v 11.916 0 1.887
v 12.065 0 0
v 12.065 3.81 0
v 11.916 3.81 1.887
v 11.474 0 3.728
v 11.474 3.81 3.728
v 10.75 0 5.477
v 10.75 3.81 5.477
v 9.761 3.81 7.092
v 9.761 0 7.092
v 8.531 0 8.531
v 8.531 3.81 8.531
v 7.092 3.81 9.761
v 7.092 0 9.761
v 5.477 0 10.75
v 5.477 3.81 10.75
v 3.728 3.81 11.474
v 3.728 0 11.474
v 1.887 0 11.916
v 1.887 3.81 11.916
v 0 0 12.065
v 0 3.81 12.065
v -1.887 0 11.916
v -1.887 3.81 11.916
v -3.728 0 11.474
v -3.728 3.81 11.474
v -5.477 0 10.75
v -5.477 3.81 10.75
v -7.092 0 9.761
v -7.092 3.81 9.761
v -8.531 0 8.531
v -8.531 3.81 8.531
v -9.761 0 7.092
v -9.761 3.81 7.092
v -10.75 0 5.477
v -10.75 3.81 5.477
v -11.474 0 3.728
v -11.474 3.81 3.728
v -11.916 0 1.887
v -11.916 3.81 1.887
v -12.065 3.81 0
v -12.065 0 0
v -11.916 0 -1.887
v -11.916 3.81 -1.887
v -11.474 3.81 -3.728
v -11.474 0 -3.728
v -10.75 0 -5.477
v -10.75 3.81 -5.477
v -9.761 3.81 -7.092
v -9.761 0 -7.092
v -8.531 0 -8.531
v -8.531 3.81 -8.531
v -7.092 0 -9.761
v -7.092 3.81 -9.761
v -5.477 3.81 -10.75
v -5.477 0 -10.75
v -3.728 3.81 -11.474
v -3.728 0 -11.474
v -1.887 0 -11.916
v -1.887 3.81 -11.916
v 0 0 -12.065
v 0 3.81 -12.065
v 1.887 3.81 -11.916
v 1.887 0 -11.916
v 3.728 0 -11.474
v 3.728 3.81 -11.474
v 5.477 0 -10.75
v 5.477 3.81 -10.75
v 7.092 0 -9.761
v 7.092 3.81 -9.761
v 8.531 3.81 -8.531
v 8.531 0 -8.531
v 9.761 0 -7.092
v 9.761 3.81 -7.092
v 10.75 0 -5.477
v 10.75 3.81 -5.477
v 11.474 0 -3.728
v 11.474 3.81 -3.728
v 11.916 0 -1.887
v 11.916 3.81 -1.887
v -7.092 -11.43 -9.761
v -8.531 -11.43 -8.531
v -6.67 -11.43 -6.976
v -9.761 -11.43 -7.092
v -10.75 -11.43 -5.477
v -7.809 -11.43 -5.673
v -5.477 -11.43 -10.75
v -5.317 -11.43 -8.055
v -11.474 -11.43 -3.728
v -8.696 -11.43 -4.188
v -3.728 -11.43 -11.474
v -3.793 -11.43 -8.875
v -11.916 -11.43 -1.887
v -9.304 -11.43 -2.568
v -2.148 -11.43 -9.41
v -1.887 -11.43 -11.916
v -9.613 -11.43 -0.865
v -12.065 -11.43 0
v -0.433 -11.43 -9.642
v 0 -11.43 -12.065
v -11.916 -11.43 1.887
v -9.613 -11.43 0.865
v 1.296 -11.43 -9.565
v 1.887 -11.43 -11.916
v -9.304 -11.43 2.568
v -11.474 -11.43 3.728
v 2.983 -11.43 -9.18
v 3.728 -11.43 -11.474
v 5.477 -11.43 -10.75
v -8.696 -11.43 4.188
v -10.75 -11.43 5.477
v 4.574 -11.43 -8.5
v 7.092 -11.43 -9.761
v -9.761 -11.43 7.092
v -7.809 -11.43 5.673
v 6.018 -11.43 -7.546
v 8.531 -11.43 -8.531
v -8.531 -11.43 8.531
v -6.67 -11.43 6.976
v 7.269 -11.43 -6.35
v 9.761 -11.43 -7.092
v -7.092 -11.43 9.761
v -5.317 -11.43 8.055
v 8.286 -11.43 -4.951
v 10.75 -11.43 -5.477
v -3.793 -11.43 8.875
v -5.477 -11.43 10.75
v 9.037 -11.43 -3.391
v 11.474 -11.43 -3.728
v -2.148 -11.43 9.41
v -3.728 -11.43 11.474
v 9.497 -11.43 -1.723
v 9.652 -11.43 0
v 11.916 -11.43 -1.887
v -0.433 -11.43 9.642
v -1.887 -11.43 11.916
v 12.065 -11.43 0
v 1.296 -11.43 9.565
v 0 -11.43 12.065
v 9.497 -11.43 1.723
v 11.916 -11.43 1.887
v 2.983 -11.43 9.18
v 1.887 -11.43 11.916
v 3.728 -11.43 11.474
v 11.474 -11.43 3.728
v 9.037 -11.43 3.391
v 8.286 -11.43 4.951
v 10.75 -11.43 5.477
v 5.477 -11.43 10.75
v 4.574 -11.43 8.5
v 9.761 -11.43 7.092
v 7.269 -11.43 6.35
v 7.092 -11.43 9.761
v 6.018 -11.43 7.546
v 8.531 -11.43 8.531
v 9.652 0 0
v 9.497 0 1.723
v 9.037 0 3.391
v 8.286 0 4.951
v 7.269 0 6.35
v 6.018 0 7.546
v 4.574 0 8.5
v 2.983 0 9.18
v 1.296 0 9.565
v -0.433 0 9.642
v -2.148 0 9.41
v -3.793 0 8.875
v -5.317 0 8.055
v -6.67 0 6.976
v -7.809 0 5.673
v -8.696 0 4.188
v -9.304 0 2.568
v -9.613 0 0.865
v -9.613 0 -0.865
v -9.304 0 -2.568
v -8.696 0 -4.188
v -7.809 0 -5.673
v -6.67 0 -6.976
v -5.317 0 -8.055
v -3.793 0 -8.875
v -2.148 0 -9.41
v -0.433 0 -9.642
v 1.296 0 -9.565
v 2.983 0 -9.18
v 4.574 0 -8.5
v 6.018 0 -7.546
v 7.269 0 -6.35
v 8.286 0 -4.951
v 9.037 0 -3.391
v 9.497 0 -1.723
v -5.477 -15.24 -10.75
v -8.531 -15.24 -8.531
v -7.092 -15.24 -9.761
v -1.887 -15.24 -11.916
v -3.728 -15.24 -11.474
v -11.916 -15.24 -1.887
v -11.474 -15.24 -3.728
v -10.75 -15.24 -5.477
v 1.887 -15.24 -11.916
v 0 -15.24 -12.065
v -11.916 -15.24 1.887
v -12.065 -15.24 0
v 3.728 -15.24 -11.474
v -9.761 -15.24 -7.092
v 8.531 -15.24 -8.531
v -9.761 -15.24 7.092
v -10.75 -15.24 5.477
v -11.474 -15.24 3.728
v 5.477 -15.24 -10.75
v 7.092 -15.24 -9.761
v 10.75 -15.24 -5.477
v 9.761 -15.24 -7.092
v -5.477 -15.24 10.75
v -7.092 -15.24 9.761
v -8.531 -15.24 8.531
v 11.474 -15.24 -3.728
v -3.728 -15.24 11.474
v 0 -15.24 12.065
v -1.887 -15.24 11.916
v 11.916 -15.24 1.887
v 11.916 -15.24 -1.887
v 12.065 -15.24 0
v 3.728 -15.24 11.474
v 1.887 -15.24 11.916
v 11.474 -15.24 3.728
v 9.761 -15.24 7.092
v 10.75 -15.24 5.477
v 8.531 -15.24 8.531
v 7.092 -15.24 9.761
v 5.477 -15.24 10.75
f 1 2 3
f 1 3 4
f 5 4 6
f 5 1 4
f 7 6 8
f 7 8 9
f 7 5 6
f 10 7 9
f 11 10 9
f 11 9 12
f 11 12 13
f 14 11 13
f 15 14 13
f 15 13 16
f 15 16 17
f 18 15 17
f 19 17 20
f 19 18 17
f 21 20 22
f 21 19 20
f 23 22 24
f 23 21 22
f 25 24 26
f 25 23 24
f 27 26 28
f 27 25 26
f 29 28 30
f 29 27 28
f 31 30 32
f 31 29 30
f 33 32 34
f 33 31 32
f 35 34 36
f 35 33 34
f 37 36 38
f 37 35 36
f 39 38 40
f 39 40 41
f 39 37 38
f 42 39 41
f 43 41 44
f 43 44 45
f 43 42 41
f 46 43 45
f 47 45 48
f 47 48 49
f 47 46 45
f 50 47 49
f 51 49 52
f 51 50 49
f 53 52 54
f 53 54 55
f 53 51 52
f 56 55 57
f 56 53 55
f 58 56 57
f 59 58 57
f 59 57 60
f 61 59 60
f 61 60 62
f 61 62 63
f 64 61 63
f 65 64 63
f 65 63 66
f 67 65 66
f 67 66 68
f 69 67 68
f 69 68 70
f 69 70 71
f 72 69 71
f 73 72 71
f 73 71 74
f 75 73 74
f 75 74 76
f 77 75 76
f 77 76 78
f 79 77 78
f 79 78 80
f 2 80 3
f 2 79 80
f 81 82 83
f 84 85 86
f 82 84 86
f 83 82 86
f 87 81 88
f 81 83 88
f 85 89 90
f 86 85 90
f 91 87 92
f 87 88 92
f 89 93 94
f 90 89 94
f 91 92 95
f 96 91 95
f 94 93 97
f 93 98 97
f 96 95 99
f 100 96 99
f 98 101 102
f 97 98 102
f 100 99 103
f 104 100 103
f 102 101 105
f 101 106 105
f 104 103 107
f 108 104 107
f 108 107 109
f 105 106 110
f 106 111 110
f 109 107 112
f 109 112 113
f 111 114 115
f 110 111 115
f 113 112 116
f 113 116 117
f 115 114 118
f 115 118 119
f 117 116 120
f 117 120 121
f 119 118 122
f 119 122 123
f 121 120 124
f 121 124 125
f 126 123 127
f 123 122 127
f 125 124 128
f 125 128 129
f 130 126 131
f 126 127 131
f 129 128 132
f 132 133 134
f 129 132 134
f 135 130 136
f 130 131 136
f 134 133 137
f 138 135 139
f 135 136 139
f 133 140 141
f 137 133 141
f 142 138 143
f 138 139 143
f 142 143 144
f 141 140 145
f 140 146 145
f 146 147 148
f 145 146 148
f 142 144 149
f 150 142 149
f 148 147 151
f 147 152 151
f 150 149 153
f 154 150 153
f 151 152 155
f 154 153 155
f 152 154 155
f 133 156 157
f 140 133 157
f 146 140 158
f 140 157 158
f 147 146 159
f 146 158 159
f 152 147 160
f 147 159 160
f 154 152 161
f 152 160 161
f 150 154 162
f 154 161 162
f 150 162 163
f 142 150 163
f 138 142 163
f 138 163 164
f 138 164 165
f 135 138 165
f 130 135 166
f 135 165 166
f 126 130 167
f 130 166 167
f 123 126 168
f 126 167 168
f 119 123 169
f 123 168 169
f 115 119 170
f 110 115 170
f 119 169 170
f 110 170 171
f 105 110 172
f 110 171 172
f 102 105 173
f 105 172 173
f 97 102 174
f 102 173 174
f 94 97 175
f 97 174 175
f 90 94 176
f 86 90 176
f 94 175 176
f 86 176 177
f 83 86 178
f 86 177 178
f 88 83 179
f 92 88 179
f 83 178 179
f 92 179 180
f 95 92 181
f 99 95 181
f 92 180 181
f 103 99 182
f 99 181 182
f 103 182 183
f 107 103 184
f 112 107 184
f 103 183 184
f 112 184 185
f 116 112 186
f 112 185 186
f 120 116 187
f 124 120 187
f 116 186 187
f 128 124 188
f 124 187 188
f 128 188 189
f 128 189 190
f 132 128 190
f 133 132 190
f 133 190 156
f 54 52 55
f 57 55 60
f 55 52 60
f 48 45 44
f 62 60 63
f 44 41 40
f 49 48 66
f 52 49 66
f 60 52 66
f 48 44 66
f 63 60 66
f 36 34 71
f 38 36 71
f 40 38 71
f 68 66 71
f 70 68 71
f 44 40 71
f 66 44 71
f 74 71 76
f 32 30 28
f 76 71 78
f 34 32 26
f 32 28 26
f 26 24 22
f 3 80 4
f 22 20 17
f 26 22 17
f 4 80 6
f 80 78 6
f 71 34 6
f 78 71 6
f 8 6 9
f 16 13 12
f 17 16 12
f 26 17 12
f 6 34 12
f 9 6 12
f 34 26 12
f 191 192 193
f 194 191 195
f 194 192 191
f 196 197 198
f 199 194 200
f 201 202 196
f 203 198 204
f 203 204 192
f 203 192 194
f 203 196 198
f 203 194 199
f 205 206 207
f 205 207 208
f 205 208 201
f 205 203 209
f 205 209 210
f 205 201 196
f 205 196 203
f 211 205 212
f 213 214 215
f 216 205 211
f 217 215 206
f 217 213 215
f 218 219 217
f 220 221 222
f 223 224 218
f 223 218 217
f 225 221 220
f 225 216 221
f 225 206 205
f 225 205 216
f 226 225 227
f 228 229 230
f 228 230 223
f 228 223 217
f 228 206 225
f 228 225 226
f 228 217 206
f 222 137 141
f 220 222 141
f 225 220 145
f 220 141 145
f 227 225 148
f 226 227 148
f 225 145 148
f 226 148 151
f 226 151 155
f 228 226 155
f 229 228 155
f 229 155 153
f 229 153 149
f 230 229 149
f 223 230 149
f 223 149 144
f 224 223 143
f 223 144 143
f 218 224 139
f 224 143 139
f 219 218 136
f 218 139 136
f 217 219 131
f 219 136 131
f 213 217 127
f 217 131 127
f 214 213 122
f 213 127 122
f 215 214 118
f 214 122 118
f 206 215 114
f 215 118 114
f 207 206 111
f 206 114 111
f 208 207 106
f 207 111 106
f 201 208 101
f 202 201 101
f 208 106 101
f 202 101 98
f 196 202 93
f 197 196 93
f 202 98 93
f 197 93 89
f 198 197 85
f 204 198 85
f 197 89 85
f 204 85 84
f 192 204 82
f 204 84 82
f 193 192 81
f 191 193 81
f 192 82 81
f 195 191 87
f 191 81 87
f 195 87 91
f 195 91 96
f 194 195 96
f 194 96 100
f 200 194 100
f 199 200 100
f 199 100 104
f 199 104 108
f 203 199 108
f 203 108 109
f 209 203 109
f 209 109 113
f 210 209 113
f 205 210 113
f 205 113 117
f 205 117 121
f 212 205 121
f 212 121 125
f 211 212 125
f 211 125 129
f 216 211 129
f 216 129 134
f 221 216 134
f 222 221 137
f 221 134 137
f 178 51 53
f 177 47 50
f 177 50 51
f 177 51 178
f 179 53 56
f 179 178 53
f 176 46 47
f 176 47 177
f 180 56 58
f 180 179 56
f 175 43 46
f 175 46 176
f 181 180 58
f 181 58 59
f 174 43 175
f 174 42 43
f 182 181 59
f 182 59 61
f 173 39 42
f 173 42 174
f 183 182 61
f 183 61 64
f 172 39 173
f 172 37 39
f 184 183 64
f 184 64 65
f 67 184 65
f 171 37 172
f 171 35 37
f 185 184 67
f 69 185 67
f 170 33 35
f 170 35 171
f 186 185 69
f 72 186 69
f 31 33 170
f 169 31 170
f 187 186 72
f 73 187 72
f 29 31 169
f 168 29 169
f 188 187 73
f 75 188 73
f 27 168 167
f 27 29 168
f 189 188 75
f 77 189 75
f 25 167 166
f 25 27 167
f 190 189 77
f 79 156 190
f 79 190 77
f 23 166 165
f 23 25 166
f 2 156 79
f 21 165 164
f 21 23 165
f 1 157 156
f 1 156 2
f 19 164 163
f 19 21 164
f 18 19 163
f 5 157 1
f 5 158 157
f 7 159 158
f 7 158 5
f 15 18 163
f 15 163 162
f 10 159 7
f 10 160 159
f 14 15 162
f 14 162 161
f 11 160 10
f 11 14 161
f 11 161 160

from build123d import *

# Parameters (mm, degrees)
F0_R     = 12.065
F1_DEPTH = 3.81
F2_R     = 9.652
F3_DEPTH = 11.43
F4_R     = 12.065
F5_DEPTH = 3.81


with BuildPart() as f1:
    # F0 (on Front) → F1 (new body)
    with BuildSketch(Plane.XZ):
        Circle(F0_R)
    extrude(amount=-F1_DEPTH)

    # F2 (on face) → F3 (join)
    with BuildSketch(Plane.XZ):
        Circle(F2_R)
    extrude(amount=F3_DEPTH)

    # F4 (on face) → F5 (join)
    with BuildSketch(Plane.XZ.offset(11.43)):
        Circle(F4_R)
    extrude(amount=F5_DEPTH)


solid = f1.part
